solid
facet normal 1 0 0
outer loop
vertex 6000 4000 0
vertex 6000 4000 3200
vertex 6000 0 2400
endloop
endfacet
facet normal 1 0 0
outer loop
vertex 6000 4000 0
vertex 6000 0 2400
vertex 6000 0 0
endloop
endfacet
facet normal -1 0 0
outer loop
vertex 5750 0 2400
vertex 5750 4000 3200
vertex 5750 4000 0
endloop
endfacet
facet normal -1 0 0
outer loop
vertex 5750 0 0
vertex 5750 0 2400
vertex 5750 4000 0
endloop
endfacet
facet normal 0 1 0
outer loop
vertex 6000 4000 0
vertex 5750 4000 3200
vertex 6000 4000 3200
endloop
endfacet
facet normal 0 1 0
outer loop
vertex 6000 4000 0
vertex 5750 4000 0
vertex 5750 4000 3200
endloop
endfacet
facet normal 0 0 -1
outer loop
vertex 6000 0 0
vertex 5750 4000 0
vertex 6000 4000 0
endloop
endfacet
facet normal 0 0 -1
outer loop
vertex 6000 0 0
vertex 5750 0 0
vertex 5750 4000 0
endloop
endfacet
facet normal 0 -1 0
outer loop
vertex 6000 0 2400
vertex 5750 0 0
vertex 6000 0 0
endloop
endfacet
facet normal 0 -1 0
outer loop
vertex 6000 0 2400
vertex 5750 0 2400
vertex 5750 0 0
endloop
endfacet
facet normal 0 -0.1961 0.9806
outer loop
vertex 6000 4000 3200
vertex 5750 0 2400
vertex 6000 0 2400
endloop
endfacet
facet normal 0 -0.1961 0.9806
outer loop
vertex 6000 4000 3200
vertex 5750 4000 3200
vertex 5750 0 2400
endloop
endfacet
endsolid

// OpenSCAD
// file: tea_shop_parameters.scad
// =============================================================================
// Tea Shop — SHARED PARAMETERS (Base & Shell)
// -----------------------------------------------------------------------------
// OpenSCAD's native unit is 1 mm, so every value here is the REAL-LIFE size
// in millimetres (1000 mm = 1 m). E.g. building_width = 6000 means 6.0 m.
//
// For MLO / FiveM (which uses metres as 1 unit = 1 m), either:
//   (a) export each STL here and re-import at a scale of 0.001 (mm -> m), or
//   (b) model in metres directly by dividing every value below by 1000.
//
// Tune each value here; every module pulls its size from these variables.
// =============================================================================


// --- building shell / roof (lean-to: TALL back, SHORT front eave) -----------
wall_thickness    = 250;   // wall panel thickness                      (0.25 m)
building_width    = 6000;  // X extent, left wall -> right wall          (6.00 m)
building_depth    = 4000;  // Y extent, front eave -> back wall          (4.00 m)
back_height       = 3200;  // full wall height at the BACK (tall side)   (3.20 m)
front_eave_height = 2400;  // wall height at the FRONT eave (short side) (2.40 m)

// --- front wall openings (service window + door), measured along X ----------
left_pier_width   = 600;   // solid pier left of the service window      (0.60 m)
window_width      = 3400;  // service window opening width — made WIDE   (3.40 m)
mid_pier_width    = 500;   // solid pier between window and door         (0.50 m)
door_width        = 1000;  // door opening width                         (1.00 m)
sill_height       = 900;   // knee-wall (sill) height beneath the window (0.90 m)

// --- base slab / plinth ------------------------------------------------------
base_thickness    = 200;   // vertical thickness of the ground plinth    (0.20 m)
base_side_margin  = 900;   // slab overhang beyond left/right walls      (0.90 m)
base_back_margin  = 600;   // slab overhang behind the back wall         (0.60 m)
base_front_margin = 3000;  // extra slab in FRONT = porch/patio (pergola)(3.00 m)


// -----------------------------------------------------------------------------
// DERIVED DIMENSIONS (do not edit — computed from the values above)
// -----------------------------------------------------------------------------

// front-wall pier chain, left -> right, must sum exactly to building_width
window_left      = left_pier_width;                    // X where the window starts
window_right     = window_left + window_width;         // X where the window ends
door_left        = window_right + mid_pier_width;      // X where the door starts
door_right       = door_left + door_width;             // X where the door ends
right_pier_width = building_width - door_right;        // fills the rest to the corner

// window opening rises from the top of the sill up to the front eave line
window_open_height = front_eave_height - sill_height;
// file: tea_shop_modules.scad
// =============================================================================
// Tea Shop — MODULE LIBRARY (Base & Shell)
// -----------------------------------------------------------------------------
// This file only DEFINES the parts (and the assemble() preview). It instantiates
// NO geometry on its own, so it can be include'd by the individual export files
// (part_*.scad) and by tea_shop_assemble.scad without producing duplicates.
//
// GLOBAL COORDINATE SYSTEM (shared by every piece — no per-part centering):
//   +X -> left -> right  (building WIDTH along X, left wall at X=0)
//   +Y -> front -> back  (building DEPTH along Y, front eave at Y=0)
//   +Z -> up             (ground/porch surface = Z=0)
//
//   Building footprint = [0..building_width] x [0..building_depth].
//   Roof = single-pitch lean-to: TALL at BACK (Y=depth), SHORT at FRONT (Y=0).
// =============================================================================

include <tea_shop_parameters.scad>;


// -----------------------------------------------------------------------------
// _trapezoid_prism — shared core for the two side walls. It draws the side
// elevation (depth x height) as a 2D polygon, then linear_extrude +
// rotate([0,-90,0]) stand it up so its thickness runs along X. The front edge
// (Y=0) is the short eave height and the back edge (Y=depth) is the full back
// height, so the top edge automatically matches the roof pitch. Result
// occupies X = [0 .. wall_thickness].
// -----------------------------------------------------------------------------
module _trapezoid_prism() {
    translate([wall_thickness, 0, 0])
        rotate([0, -90, 0])
            linear_extrude(height = wall_thickness)
                polygon(points = [
                    [0,                 0],               // front, ground
                    [0,                 building_depth],  // back,  ground
                    [back_height,       building_depth],  // back,  top (tall)
                    [front_eave_height, 0]                // front, top (eave)
                ]);
}


// =============================================================================
// base_slab — flat ground plinth. Extends past the building on all sides, with
// a generous margin up front to form the porch/patio where the bench / stools
// sit under the pergola. Top surface is the datum Z=0.
// =============================================================================
module base_slab() {
    translate([-base_side_margin, -base_front_margin, -base_thickness])
        cube([
            building_width + 2 * base_side_margin,                 // X
            building_depth + base_front_margin + base_back_margin, // Y
            base_thickness                                          // Z
        ]);
}


// =============================================================================
// back_wall — solid rectangular panel, full building width and FULL height
// (the tall side of the lean-to). Sits at the back edge of the footprint.
// =============================================================================
module back_wall() {
    translate([0, building_depth - wall_thickness, 0])
        cube([building_width, wall_thickness, back_height]);
}


// =============================================================================
// left_side_wall — trapezoidal panel, TALL at the back edge and SHORT at the
// front edge, matching the roof slope. Occupies X = [0 .. wall_thickness].
// =============================================================================
module left_side_wall() {
    _trapezoid_prism();
}


// =============================================================================
// right_side_wall — mirror image of the left wall (identical trapezoid cross
// section, since both walls slope down toward the FRONT eave), placed at the
// right edge X = [building_width - wall_thickness .. building_width].
// Plain — no openings.
// =============================================================================
module right_side_wall() {
    translate([building_width - wall_thickness, 0, 0])
        _trapezoid_prism();
}


// =============================================================================
// FRONT WALL — broken into solid piers + a knee-wall (sill), leaving a service
// window opening and a door opening. Every front piece tops out at the front
// eave height (the horizontal line where the roof meets the front wall).
//
//   |<- left ->|<--- window --->|<- mid ->|<-- door -->|<- right ->|
//   |   pier   |    (opening)   |   pier  |  (opening)  |   pier   |
//   |          |   [sill below] |         |             |          |
// =============================================================================

// front_wall_left_pier — solid pier left of the service window, ground to eave.
module front_wall_left_pier() {
    translate([0, 0, 0])
        cube([left_pier_width, wall_thickness, front_eave_height]);
}


// front_wall_sill — the low knee-wall beneath the service window opening.
// The window opening sits above it.
// TODO: counter + window frame modules slot in above this sill (later group).
module front_wall_sill() {
    translate([window_left, 0, 0])
        cube([window_width, wall_thickness, sill_height]);
}


// front_wall_mid_pier — solid pier between the window and the door, full height.
module front_wall_mid_pier() {
    translate([window_right, 0, 0])
        cube([mid_pier_width, wall_thickness, front_eave_height]);
}


// front_wall_right_pier — solid pier right of the door, out to the front corner.
// Width is derived so the pier chain always ends flush with the right corner.
module front_wall_right_pier() {
    translate([door_right, 0, 0])
        cube([right_pier_width, wall_thickness, front_eave_height]);
}


// -----------------------------------------------------------------------------
// OPENING ANNOTATIONS (for reference — these are EMPTY volumes in the shell):
//
//   Service window opening:
//     X = [window_left .. window_right], Z = [sill_height .. front_eave_height]
//     TODO: window frame + service counter modules slot in here (later group).
//
//   Door opening:
//     X = [door_left .. door_right], Z = [0 .. front_eave_height] (full height)
//     TODO: door / door-frame module slots in here (later group).
// -----------------------------------------------------------------------------


// =============================================================================
// assemble — visual verification ONLY (not for export). Shows every piece in
// the shared coordinate system, each in its own colour, so the assembled shell
// can be checked against the reference before exporting individual STLs.
// =============================================================================
module assemble() {
    color("LightGray")  base_slab();

    color("SkyBlue")    back_wall();
    color("Orange")     left_side_wall();
    color("Orange")     right_side_wall();

    color("FireBrick")  front_wall_left_pier();
    color("Peru")       front_wall_sill();
    color("FireBrick")  front_wall_mid_pier();
    color("FireBrick")  front_wall_right_pier();
}
// main file
// =============================================================================
// part_right_side_wall.scad — export the RIGHT SIDE WALL only (trapezoid panel).
// Open this file, press F6 (render), then export as STL. Everything sits in the
// shared global coordinate system, so re-importing all parts together lines up
// automatically with no manual repositioning.
// =============================================================================

include <tea_shop_modules.scad>;

right_side_wall();
